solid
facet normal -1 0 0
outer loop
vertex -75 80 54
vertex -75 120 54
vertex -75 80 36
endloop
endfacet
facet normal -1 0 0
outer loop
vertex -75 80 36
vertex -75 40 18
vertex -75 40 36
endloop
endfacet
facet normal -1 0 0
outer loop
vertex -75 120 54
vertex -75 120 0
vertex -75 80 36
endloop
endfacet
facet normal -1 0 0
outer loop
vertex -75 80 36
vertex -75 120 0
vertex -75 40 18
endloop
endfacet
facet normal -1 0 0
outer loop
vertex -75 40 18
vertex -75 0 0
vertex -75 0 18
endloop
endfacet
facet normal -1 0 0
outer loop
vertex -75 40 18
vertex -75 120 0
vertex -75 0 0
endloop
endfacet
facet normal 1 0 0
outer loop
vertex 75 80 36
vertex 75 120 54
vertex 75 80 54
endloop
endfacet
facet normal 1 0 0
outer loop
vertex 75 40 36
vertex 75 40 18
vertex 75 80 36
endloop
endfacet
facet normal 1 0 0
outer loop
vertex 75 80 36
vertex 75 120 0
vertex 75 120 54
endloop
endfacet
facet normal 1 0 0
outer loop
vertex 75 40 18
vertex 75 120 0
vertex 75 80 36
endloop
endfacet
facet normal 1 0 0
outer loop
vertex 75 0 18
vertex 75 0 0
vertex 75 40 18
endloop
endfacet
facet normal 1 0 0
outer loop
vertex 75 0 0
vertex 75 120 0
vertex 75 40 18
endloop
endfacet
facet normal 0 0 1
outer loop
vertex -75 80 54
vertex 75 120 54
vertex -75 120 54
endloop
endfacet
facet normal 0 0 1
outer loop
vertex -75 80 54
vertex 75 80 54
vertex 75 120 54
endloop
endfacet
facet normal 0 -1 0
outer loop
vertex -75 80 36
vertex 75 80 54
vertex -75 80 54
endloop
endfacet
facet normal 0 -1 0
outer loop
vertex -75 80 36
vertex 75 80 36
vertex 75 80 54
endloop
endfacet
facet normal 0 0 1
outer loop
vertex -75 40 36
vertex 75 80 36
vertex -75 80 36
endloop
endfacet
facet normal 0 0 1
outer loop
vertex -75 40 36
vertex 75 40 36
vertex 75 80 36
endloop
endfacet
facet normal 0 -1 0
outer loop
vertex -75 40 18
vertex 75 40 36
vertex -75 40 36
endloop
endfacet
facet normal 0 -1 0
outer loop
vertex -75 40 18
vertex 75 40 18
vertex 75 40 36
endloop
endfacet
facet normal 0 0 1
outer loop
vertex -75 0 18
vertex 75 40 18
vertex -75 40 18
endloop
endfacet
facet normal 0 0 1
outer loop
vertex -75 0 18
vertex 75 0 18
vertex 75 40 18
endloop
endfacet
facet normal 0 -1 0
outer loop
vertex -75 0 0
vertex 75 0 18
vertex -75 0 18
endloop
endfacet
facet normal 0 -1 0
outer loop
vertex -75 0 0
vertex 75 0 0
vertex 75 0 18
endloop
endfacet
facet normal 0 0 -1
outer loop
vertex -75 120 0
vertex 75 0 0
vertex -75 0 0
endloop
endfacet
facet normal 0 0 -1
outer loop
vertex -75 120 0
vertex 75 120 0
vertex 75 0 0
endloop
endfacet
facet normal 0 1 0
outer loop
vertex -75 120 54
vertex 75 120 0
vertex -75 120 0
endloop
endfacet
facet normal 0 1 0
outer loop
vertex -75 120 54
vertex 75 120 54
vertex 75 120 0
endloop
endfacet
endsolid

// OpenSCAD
// Display risers and plinths for action figures, models and collectibles - original parametric design (Brian Sacco).
// part: "riser" (stepped riser), "plinth_round", "plinth_hex". All print flat on the bed, no supports.
part   = "riser";
steps  = 3;      // riser: number of steps
tread  = 40;     // riser: depth of each step (mm), fits a 15 cm (6 in) figure's feet
rise   = 18;     // riser: height of each step (mm)
w      = 150;    // riser: width (mm)
d      = 80;     // plinth: diameter (round) or across corners (hex)
h      = 14;     // plinth: height
peg    = 0;      // plinth: centre hole diameter (0 = none)
$fn = 96;

module riser() {
    pts = concat([[0, 0], [steps * tread, 0]],
                 [for (i = [steps - 1 : -1 : 0]) each [[(i + 1) * tread, (i + 1) * rise], [i * tread, (i + 1) * rise]]]);
    translate([-w / 2, 0, 0]) rotate([90, 0, 90]) linear_extrude(w) polygon(pts);
}
module plinth_body(sides) {
    hull() {
        cylinder(d = d, h = h - 3, $fn = sides);
        translate([0, 0, h - 0.01]) cylinder(d = d - 6, h = 0.01, $fn = sides);   // 45 deg top chamfer
    }
}
module plinth(sides) {
    difference() {
        plinth_body(sides);
        translate([0, 0, h - 0.6]) difference() {   // decorative ring groove
            cylinder(d = d - 18, h = 1, $fn = sides);
            translate([0, 0, -0.1]) cylinder(d = d - 20, h = 1.2, $fn = sides);
        }
        if (peg > 0) translate([0, 0, h - 10]) cylinder(d = peg, h = 11);
    }
}
if (part == "riser") riser();
if (part == "plinth_round") plinth(96);
if (part == "plinth_hex") plinth(6);
